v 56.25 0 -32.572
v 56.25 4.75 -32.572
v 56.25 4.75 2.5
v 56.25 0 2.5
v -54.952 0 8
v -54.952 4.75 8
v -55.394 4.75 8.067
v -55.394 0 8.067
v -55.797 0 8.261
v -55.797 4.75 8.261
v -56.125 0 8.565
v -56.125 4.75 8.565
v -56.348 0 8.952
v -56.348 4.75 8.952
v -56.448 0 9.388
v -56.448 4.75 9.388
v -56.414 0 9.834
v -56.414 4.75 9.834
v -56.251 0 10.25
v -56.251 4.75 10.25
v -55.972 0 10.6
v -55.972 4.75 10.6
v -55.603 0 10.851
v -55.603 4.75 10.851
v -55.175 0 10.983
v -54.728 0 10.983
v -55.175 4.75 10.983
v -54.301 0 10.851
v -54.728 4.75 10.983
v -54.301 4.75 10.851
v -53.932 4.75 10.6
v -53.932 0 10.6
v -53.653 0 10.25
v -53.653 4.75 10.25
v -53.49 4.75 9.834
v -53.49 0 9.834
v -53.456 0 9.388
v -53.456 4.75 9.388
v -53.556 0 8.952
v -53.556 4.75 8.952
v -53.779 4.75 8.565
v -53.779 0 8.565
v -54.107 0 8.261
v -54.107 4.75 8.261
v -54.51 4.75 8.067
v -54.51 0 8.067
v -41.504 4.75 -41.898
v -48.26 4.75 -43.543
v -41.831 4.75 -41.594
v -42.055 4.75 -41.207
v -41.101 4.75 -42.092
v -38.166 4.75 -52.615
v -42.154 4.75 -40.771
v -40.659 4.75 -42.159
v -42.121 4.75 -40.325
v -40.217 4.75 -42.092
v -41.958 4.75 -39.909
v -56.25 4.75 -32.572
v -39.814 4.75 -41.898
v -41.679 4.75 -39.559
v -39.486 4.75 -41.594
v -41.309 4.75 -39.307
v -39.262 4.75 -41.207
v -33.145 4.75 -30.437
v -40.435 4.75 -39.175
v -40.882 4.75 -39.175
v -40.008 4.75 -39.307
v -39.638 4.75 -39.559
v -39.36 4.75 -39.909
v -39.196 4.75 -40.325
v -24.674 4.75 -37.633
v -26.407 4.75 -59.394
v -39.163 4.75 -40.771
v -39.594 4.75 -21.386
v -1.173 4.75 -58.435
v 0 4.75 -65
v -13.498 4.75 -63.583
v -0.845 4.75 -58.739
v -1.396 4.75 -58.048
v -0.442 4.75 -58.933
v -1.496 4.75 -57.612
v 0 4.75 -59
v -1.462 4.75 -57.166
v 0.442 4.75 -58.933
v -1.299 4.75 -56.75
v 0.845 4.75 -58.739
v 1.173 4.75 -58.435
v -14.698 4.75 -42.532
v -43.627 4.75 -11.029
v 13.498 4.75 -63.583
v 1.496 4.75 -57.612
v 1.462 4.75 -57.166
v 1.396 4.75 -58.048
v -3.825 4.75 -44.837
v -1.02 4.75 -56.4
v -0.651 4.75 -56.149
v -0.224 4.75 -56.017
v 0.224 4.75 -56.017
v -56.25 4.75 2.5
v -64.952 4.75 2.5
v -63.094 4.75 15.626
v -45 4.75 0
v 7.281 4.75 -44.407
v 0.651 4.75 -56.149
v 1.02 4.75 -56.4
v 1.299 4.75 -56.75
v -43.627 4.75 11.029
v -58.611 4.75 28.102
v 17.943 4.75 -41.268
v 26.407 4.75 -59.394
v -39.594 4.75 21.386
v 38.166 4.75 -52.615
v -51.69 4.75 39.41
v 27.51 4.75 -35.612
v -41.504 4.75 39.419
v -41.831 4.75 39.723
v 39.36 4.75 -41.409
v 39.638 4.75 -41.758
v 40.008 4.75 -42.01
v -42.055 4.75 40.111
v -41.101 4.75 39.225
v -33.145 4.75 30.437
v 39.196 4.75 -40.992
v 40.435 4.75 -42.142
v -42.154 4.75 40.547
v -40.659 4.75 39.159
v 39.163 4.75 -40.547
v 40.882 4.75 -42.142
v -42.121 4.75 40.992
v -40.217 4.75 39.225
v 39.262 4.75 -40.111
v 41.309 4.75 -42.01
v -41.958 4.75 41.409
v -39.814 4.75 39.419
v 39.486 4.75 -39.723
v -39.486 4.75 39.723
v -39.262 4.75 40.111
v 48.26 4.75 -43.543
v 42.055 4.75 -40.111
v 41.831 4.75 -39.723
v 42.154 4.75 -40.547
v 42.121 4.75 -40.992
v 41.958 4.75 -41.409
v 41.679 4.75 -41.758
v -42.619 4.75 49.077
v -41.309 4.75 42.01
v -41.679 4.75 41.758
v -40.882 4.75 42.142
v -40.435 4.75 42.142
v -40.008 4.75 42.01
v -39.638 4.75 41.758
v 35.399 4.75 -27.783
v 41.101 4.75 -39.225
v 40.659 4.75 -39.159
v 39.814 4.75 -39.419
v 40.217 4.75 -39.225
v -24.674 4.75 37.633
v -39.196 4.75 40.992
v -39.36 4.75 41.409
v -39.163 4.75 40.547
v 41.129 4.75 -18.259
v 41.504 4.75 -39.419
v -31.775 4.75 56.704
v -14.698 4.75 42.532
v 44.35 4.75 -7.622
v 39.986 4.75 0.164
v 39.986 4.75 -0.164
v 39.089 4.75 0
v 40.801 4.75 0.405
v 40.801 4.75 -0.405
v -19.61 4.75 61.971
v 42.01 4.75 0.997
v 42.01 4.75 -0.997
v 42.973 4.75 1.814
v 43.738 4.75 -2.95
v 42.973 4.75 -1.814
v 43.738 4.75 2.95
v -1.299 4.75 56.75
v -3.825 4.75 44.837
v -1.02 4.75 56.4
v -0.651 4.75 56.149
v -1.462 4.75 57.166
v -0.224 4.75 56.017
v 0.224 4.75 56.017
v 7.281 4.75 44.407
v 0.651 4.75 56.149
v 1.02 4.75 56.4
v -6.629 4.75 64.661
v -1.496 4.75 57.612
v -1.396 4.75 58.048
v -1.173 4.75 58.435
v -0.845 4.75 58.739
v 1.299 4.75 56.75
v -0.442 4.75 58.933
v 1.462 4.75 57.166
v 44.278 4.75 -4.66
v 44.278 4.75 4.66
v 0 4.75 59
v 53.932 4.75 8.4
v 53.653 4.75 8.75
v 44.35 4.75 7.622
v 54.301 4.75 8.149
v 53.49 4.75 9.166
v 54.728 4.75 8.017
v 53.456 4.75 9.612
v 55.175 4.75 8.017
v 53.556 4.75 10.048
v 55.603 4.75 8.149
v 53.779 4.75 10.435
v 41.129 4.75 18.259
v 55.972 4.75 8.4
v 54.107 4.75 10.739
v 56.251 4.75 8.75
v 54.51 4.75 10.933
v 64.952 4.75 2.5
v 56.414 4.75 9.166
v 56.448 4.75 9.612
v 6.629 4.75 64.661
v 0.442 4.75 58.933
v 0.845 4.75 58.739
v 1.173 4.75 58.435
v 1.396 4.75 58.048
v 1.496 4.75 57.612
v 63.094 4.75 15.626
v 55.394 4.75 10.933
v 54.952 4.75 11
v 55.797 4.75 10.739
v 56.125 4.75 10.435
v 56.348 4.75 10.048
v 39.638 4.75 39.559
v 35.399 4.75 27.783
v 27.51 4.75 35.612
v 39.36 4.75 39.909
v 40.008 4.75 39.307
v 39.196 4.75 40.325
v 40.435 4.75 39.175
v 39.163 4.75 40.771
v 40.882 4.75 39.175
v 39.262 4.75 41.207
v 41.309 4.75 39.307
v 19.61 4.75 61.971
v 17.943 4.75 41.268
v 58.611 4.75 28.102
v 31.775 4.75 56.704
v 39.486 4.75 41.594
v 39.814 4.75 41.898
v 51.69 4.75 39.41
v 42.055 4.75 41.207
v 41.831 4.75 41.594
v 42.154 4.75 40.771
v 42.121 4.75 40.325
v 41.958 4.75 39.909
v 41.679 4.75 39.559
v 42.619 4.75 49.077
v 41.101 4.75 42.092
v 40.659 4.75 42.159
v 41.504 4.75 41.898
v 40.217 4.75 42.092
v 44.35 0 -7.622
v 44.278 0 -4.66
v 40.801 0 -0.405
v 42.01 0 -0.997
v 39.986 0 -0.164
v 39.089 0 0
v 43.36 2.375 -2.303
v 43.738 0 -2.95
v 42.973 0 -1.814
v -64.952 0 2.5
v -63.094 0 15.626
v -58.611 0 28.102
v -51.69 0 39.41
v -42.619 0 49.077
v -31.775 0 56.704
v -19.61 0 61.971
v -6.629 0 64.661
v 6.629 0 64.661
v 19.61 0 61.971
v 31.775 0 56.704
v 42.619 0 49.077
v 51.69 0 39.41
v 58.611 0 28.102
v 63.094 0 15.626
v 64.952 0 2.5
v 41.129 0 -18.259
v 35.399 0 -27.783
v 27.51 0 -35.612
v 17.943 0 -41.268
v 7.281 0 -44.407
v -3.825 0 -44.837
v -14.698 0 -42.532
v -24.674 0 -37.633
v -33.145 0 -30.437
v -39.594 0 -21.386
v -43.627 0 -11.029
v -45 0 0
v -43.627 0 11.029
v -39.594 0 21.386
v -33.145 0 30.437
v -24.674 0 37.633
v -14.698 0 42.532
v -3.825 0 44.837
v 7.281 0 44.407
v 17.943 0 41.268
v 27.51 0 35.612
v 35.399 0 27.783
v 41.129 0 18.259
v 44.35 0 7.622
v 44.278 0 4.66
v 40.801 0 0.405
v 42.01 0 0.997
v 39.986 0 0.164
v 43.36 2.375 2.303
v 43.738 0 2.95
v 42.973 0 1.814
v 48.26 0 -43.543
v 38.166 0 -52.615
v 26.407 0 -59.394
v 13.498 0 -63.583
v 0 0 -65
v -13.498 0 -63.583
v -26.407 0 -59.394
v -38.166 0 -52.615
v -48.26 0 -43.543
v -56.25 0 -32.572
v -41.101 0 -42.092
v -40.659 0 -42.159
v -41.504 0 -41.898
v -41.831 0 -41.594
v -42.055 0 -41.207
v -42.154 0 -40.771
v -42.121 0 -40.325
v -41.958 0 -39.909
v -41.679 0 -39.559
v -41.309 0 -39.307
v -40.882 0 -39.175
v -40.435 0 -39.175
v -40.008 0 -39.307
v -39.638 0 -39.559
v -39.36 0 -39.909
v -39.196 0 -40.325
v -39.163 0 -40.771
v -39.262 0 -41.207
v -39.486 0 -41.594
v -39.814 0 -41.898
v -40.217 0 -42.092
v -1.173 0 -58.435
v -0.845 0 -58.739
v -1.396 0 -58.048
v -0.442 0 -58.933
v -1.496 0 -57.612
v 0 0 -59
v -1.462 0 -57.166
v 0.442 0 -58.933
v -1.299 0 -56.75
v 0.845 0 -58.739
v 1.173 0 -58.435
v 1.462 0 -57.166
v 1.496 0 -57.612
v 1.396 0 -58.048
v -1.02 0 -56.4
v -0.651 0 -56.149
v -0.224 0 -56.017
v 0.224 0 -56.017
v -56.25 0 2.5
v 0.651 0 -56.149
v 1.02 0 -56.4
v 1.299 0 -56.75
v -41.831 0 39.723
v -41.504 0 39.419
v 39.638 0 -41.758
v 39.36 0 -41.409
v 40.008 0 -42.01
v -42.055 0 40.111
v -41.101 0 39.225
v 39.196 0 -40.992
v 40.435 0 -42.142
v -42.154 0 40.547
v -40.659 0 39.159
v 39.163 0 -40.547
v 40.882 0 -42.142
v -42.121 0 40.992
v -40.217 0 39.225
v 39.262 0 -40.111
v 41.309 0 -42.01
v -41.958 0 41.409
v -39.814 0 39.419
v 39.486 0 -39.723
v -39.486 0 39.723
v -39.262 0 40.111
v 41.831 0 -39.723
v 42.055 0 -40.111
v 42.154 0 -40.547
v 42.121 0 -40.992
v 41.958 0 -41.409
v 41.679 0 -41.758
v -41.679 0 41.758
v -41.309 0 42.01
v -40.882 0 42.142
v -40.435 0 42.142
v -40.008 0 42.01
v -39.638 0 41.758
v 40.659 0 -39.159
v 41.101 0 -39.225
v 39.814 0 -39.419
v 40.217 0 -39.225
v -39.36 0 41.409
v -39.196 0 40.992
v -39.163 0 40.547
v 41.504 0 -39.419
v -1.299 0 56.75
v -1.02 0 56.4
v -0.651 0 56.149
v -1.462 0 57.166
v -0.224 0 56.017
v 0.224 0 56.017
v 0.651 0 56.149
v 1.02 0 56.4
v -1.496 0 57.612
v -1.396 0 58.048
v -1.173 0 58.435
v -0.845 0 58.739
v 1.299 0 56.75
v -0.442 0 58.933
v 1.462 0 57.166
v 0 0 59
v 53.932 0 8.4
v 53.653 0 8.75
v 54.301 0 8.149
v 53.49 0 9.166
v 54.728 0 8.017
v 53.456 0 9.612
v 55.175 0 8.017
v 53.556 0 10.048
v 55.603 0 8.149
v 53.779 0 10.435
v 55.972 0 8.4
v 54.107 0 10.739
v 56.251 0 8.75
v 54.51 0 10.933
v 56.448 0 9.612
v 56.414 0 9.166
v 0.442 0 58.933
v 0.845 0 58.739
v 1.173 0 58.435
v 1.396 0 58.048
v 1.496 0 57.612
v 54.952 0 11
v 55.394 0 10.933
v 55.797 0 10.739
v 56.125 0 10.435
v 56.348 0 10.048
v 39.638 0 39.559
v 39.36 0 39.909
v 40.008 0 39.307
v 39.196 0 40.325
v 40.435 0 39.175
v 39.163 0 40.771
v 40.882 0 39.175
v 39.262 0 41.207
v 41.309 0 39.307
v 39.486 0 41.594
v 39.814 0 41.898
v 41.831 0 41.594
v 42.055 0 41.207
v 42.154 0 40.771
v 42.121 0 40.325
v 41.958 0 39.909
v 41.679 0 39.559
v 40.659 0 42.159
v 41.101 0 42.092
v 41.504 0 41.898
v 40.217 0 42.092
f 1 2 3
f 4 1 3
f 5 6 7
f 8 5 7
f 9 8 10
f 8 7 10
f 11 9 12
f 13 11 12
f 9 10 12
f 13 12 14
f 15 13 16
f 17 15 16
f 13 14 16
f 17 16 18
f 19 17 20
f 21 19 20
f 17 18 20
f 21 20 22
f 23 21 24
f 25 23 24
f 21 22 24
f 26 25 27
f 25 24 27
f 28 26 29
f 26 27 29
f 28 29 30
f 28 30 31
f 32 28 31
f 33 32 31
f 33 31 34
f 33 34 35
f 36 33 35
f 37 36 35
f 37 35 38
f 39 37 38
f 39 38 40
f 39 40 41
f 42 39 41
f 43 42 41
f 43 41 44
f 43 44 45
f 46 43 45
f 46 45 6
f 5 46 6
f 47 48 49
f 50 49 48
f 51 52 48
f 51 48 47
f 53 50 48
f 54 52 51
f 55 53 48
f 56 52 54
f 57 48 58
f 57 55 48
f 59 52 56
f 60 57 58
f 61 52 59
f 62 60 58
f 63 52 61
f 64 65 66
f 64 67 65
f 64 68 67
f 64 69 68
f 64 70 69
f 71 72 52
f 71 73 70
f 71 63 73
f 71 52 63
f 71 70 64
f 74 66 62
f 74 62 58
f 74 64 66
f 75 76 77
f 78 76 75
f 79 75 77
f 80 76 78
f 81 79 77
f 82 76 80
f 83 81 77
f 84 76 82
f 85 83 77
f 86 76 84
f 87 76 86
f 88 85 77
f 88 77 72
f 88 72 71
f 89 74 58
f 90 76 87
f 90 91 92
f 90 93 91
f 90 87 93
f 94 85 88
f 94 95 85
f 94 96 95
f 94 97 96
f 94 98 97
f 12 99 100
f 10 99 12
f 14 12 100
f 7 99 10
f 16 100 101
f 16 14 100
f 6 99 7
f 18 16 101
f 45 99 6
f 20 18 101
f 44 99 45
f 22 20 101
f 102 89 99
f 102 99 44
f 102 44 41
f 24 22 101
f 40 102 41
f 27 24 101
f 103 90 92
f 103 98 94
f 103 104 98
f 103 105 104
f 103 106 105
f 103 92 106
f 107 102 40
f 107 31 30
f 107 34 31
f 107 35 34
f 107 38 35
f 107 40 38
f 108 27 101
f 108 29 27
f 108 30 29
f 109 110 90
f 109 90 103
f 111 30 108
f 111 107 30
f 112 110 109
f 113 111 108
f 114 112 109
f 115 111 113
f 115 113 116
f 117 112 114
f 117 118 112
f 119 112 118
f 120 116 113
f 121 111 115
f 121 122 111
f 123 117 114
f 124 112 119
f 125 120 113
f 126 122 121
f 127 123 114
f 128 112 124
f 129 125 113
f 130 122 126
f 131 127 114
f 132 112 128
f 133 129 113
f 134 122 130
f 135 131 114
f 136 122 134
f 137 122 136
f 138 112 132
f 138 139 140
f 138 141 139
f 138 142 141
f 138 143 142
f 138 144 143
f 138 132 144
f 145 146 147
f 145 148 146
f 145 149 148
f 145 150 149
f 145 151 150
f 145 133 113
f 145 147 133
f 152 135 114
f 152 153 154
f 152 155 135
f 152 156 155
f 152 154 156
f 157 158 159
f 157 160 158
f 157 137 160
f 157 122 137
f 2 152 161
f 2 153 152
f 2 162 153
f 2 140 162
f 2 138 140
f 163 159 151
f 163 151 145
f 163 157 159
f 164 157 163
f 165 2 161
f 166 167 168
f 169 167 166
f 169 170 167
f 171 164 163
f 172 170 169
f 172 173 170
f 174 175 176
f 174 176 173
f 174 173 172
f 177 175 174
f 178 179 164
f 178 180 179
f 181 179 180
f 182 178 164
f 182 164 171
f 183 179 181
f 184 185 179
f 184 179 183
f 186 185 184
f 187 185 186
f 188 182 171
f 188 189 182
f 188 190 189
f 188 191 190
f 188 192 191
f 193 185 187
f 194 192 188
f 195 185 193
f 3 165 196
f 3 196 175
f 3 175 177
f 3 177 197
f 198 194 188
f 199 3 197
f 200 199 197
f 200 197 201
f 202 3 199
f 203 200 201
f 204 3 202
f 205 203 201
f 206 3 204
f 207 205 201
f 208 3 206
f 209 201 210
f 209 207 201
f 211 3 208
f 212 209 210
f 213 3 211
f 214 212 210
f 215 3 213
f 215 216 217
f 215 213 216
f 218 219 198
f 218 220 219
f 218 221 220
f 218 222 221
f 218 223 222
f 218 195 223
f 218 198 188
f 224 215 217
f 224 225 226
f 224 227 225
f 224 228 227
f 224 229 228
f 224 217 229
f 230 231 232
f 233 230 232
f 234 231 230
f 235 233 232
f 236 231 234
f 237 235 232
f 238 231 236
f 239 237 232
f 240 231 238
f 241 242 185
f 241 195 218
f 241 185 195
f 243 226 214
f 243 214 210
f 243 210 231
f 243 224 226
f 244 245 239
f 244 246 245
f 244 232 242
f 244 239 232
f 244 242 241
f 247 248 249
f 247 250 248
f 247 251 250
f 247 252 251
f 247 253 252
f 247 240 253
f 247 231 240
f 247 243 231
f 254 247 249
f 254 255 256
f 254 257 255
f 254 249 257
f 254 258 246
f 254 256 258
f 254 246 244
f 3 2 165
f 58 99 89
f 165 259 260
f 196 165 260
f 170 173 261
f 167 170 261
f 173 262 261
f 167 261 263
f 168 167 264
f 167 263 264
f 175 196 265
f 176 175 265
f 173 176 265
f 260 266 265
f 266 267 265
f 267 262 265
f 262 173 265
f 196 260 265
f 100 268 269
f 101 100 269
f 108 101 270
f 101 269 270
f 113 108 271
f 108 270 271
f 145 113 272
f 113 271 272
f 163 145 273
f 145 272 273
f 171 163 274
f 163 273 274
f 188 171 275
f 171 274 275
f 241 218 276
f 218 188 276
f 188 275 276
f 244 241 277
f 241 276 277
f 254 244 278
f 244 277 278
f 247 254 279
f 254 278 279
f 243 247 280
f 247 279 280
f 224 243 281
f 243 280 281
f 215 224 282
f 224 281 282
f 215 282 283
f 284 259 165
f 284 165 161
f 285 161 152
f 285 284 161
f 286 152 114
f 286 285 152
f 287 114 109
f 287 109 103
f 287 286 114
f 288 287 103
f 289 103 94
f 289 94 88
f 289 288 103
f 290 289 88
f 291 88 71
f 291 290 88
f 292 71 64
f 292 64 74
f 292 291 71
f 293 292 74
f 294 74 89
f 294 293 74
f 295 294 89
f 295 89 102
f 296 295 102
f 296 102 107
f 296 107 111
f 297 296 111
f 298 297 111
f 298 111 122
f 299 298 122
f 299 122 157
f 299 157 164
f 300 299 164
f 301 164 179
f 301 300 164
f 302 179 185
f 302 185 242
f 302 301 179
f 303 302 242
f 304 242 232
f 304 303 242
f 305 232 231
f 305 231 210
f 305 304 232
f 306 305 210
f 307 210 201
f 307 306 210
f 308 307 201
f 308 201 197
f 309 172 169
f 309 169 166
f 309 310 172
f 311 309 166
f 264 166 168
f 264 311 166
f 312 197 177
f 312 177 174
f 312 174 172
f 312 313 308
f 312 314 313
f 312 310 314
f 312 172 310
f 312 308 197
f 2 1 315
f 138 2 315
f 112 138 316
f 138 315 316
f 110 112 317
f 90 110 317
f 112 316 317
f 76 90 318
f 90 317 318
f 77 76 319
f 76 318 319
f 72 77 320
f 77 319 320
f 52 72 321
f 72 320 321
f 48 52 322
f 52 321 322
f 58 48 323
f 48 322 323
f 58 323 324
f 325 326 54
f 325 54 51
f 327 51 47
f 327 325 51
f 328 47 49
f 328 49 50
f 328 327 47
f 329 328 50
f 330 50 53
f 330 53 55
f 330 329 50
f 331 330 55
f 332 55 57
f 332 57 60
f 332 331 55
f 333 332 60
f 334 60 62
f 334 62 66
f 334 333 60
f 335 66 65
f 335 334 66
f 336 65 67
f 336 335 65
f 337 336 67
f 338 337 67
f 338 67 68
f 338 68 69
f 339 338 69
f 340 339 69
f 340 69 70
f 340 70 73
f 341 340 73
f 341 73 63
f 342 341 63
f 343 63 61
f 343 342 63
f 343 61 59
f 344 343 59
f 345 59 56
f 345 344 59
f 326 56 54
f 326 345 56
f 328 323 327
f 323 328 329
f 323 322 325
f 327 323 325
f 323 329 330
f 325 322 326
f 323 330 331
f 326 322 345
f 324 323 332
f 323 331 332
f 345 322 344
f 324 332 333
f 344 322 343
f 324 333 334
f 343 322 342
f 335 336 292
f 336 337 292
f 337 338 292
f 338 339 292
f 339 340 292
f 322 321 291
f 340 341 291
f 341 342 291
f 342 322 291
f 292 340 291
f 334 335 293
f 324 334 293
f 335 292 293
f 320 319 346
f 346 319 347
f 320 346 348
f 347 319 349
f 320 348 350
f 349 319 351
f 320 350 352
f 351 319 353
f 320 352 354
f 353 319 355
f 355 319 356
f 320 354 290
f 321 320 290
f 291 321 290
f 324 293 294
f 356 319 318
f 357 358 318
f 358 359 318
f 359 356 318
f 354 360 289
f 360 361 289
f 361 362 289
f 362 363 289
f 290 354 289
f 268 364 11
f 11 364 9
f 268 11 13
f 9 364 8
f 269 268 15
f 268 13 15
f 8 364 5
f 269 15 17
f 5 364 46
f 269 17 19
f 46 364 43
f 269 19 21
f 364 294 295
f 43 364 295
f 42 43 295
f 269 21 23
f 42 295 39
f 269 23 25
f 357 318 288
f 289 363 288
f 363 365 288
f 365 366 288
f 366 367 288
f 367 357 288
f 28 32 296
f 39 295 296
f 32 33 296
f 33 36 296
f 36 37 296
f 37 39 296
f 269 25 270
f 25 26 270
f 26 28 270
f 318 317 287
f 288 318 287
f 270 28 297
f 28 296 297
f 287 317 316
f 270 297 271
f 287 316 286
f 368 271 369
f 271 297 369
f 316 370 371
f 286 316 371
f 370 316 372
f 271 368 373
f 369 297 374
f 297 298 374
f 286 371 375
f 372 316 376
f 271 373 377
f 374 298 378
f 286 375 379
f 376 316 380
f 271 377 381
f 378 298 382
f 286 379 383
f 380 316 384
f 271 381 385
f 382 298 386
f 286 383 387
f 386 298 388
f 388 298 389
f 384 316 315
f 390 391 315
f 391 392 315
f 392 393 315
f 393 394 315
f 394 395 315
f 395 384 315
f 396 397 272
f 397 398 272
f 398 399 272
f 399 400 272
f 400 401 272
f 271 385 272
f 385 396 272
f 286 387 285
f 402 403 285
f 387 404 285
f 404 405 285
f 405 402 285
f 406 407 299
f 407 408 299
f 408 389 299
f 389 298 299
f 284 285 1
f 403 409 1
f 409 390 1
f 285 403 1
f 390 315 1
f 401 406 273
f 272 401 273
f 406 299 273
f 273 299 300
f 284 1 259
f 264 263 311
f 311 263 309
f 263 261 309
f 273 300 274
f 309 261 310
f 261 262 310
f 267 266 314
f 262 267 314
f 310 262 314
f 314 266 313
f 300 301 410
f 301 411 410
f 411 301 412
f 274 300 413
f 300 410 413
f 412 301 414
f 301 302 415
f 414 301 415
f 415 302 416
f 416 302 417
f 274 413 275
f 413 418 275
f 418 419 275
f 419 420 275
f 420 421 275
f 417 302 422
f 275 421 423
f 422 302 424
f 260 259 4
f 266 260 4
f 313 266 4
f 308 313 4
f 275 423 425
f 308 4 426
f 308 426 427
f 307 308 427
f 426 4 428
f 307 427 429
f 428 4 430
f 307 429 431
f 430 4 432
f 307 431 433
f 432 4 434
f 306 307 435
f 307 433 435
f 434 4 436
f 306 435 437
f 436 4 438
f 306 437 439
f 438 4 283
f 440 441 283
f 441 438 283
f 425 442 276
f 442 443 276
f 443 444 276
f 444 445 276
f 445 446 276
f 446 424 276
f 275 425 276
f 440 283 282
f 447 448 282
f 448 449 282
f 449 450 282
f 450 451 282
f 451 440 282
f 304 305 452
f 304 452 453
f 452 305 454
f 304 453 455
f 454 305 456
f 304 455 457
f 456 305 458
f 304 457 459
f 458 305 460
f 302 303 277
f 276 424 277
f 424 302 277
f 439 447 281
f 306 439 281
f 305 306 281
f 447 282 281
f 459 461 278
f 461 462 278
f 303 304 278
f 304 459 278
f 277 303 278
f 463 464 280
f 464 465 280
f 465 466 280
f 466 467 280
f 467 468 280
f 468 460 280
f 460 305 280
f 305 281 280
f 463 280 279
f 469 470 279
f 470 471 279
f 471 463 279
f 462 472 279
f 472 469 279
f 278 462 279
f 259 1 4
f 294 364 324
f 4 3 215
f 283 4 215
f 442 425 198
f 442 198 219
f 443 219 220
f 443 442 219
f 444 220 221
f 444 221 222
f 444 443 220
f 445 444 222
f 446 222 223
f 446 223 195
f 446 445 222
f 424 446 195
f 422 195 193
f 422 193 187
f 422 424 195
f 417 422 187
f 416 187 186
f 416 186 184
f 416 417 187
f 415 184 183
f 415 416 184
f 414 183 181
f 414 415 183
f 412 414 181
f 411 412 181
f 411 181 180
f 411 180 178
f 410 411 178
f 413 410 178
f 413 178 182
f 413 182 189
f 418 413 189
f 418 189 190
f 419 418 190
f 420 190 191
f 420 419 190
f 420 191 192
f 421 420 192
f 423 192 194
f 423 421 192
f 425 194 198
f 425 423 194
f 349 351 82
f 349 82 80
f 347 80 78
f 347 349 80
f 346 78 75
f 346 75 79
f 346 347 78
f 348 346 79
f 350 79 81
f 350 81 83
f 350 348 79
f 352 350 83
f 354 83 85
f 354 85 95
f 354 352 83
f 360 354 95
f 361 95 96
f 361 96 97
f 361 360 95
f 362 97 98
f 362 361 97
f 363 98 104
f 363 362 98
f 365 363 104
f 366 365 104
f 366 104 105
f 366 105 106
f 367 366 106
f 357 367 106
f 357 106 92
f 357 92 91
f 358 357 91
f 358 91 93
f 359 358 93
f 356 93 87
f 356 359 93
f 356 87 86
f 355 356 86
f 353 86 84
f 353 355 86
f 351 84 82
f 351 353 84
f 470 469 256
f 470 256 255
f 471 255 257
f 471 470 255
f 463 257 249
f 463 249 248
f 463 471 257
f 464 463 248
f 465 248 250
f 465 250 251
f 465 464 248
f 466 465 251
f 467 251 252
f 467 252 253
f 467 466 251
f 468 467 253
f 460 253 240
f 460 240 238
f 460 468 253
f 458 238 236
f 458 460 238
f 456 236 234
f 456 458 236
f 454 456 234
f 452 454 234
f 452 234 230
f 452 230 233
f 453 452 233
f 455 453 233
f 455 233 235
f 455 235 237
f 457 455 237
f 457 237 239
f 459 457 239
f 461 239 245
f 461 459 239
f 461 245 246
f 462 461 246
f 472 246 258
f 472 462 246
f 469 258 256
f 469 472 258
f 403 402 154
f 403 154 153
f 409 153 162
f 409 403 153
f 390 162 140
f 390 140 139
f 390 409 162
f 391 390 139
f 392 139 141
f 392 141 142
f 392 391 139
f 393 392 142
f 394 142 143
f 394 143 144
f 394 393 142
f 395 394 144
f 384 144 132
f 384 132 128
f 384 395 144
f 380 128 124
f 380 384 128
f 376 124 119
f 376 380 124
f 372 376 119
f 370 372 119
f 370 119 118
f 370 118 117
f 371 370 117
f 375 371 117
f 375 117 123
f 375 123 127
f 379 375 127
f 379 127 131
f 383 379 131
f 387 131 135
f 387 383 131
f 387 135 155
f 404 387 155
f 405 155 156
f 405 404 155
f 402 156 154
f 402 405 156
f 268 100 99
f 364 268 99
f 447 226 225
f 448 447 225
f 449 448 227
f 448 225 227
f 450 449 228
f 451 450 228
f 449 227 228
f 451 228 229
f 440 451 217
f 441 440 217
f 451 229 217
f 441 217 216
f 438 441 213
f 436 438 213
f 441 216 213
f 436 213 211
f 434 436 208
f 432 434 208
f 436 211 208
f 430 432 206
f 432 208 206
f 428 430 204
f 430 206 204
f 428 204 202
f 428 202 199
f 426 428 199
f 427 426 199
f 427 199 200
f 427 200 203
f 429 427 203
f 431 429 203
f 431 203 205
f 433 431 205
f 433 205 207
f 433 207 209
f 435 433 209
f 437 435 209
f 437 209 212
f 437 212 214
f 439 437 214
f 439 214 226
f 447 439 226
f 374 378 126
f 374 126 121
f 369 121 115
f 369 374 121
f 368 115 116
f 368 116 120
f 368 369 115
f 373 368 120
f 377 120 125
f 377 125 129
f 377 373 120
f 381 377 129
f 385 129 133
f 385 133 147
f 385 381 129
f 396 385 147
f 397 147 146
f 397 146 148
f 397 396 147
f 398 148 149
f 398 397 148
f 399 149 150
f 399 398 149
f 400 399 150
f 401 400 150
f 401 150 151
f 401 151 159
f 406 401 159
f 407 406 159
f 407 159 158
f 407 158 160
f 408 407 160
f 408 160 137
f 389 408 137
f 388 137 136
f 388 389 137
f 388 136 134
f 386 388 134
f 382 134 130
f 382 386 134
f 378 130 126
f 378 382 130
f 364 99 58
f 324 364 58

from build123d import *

# Parameters (mm, degrees)
SKETCH1_R           = 65
SKETCH1_R_2         = 1.5
BOSS_EXTRUDE1_DEPTH = 4.75
SKETCH3_W           = 10
SKETCH3_H           = 5
CUT_EXTRUDE1_DEPTH  = 5
SKETCH4_R           = 1.5
CUT_EXTRUDE2_DEPTH  = 93.012567223
CUT_EXTRUDE3_DEPTH  = 93.012567223


with BuildPart() as part:
    # Sketch1 → Boss-Extrude1 (new body)
    with BuildSketch(Plane(origin=(0, 0, 0), x_dir=(1, 0, 0), z_dir=(0, 1, 0))):
        Circle(SKETCH1_R)
        with Locations((0, -57.5)):
            Circle(SKETCH1_R_2, mode=Mode.SUBTRACT)
        with Locations((40.658639918, -40.658639918)):
            Circle(SKETCH1_R_2, mode=Mode.SUBTRACT)
        with Locations((40.658639918, 40.658639918)):
            Circle(SKETCH1_R_2, mode=Mode.SUBTRACT)
        with Locations((0, 57.5)):
            Circle(SKETCH1_R_2, mode=Mode.SUBTRACT)
        with Locations((-40.658639918, 40.658639918)):
            Circle(SKETCH1_R_2, mode=Mode.SUBTRACT)
        with Locations((-40.658639918, -40.658639918)):
            Circle(SKETCH1_R_2, mode=Mode.SUBTRACT)
        with BuildLine():
            ThreePointArc((44.349781873, 7.622128822), (-45, 0), (44.349781873, -7.622128822))
            add(Edge.make_bspline(
                [(44.349781873, -7.622128822), (45, -0.795007083), (39.088787829, 0)],
                knots=[0, 0, 0, 1, 1, 1], degree=2))
            add(Edge.make_bspline(
                [(44.349781873, 7.622128822), (45, 0.795007083), (39.088787829, 0)],
                knots=[0, 0, 0, 1, 1, 1], degree=2))
        make_face(mode=Mode.SUBTRACT)
    extrude(amount=BOSS_EXTRUDE1_DEPTH)

    # Sketch3 → Cut-Extrude1 (cut)
    with BuildSketch(Plane(origin=(0, 4.75, 0), x_dir=(1, 0, 0), z_dir=(0, 1, 0))):
        with Locations((61.25, 0)):
            Rectangle(SKETCH3_W, SKETCH3_H)
        with Locations((-61.25, 0)):
            Rectangle(SKETCH3_W, SKETCH3_H)
    extrude(amount=-CUT_EXTRUDE1_DEPTH, mode=Mode.SUBTRACT)

    # Sketch4 → Cut-Extrude2 (cut, through all)
    with BuildSketch(Plane(origin=(0, 4.75, 0), x_dir=(1, 0, 0), z_dir=(0, 1, 0))):
        with Locations((54.951905284, -9.5)):
            Circle(SKETCH4_R)
        with Locations((-54.951905284, -9.5)):
            Circle(SKETCH4_R)
    extrude(amount=-CUT_EXTRUDE2_DEPTH, mode=Mode.SUBTRACT)

    # Sketch5 → Cut-Extrude3 (cut, through all)
    with BuildSketch(Plane(origin=(0, 4.75, 0), x_dir=(1, 0, 0), z_dir=(0, 1, 0))):
        with BuildLine():
            Line((-64.951905284, 2.5), (-56.25, 2.5))
            Line((-56.25, 2.5), (-56.25, 32.572035552))
            ThreePointArc((-56.25, 32.572035552), (-62.438428004, 18.067725599), (-64.951905284, 2.5))
        make_face()
        with BuildLine():
            ThreePointArc((64.951905284, 2.5), (62.438428004, 18.067725599), (56.25, 32.572035552))
            Line((56.25, 32.572035552), (56.25, 2.5))
            Line((56.25, 2.5), (64.951905284, 2.5))
        make_face()
    extrude(amount=-CUT_EXTRUDE3_DEPTH, mode=Mode.SUBTRACT)


solid = part.part
